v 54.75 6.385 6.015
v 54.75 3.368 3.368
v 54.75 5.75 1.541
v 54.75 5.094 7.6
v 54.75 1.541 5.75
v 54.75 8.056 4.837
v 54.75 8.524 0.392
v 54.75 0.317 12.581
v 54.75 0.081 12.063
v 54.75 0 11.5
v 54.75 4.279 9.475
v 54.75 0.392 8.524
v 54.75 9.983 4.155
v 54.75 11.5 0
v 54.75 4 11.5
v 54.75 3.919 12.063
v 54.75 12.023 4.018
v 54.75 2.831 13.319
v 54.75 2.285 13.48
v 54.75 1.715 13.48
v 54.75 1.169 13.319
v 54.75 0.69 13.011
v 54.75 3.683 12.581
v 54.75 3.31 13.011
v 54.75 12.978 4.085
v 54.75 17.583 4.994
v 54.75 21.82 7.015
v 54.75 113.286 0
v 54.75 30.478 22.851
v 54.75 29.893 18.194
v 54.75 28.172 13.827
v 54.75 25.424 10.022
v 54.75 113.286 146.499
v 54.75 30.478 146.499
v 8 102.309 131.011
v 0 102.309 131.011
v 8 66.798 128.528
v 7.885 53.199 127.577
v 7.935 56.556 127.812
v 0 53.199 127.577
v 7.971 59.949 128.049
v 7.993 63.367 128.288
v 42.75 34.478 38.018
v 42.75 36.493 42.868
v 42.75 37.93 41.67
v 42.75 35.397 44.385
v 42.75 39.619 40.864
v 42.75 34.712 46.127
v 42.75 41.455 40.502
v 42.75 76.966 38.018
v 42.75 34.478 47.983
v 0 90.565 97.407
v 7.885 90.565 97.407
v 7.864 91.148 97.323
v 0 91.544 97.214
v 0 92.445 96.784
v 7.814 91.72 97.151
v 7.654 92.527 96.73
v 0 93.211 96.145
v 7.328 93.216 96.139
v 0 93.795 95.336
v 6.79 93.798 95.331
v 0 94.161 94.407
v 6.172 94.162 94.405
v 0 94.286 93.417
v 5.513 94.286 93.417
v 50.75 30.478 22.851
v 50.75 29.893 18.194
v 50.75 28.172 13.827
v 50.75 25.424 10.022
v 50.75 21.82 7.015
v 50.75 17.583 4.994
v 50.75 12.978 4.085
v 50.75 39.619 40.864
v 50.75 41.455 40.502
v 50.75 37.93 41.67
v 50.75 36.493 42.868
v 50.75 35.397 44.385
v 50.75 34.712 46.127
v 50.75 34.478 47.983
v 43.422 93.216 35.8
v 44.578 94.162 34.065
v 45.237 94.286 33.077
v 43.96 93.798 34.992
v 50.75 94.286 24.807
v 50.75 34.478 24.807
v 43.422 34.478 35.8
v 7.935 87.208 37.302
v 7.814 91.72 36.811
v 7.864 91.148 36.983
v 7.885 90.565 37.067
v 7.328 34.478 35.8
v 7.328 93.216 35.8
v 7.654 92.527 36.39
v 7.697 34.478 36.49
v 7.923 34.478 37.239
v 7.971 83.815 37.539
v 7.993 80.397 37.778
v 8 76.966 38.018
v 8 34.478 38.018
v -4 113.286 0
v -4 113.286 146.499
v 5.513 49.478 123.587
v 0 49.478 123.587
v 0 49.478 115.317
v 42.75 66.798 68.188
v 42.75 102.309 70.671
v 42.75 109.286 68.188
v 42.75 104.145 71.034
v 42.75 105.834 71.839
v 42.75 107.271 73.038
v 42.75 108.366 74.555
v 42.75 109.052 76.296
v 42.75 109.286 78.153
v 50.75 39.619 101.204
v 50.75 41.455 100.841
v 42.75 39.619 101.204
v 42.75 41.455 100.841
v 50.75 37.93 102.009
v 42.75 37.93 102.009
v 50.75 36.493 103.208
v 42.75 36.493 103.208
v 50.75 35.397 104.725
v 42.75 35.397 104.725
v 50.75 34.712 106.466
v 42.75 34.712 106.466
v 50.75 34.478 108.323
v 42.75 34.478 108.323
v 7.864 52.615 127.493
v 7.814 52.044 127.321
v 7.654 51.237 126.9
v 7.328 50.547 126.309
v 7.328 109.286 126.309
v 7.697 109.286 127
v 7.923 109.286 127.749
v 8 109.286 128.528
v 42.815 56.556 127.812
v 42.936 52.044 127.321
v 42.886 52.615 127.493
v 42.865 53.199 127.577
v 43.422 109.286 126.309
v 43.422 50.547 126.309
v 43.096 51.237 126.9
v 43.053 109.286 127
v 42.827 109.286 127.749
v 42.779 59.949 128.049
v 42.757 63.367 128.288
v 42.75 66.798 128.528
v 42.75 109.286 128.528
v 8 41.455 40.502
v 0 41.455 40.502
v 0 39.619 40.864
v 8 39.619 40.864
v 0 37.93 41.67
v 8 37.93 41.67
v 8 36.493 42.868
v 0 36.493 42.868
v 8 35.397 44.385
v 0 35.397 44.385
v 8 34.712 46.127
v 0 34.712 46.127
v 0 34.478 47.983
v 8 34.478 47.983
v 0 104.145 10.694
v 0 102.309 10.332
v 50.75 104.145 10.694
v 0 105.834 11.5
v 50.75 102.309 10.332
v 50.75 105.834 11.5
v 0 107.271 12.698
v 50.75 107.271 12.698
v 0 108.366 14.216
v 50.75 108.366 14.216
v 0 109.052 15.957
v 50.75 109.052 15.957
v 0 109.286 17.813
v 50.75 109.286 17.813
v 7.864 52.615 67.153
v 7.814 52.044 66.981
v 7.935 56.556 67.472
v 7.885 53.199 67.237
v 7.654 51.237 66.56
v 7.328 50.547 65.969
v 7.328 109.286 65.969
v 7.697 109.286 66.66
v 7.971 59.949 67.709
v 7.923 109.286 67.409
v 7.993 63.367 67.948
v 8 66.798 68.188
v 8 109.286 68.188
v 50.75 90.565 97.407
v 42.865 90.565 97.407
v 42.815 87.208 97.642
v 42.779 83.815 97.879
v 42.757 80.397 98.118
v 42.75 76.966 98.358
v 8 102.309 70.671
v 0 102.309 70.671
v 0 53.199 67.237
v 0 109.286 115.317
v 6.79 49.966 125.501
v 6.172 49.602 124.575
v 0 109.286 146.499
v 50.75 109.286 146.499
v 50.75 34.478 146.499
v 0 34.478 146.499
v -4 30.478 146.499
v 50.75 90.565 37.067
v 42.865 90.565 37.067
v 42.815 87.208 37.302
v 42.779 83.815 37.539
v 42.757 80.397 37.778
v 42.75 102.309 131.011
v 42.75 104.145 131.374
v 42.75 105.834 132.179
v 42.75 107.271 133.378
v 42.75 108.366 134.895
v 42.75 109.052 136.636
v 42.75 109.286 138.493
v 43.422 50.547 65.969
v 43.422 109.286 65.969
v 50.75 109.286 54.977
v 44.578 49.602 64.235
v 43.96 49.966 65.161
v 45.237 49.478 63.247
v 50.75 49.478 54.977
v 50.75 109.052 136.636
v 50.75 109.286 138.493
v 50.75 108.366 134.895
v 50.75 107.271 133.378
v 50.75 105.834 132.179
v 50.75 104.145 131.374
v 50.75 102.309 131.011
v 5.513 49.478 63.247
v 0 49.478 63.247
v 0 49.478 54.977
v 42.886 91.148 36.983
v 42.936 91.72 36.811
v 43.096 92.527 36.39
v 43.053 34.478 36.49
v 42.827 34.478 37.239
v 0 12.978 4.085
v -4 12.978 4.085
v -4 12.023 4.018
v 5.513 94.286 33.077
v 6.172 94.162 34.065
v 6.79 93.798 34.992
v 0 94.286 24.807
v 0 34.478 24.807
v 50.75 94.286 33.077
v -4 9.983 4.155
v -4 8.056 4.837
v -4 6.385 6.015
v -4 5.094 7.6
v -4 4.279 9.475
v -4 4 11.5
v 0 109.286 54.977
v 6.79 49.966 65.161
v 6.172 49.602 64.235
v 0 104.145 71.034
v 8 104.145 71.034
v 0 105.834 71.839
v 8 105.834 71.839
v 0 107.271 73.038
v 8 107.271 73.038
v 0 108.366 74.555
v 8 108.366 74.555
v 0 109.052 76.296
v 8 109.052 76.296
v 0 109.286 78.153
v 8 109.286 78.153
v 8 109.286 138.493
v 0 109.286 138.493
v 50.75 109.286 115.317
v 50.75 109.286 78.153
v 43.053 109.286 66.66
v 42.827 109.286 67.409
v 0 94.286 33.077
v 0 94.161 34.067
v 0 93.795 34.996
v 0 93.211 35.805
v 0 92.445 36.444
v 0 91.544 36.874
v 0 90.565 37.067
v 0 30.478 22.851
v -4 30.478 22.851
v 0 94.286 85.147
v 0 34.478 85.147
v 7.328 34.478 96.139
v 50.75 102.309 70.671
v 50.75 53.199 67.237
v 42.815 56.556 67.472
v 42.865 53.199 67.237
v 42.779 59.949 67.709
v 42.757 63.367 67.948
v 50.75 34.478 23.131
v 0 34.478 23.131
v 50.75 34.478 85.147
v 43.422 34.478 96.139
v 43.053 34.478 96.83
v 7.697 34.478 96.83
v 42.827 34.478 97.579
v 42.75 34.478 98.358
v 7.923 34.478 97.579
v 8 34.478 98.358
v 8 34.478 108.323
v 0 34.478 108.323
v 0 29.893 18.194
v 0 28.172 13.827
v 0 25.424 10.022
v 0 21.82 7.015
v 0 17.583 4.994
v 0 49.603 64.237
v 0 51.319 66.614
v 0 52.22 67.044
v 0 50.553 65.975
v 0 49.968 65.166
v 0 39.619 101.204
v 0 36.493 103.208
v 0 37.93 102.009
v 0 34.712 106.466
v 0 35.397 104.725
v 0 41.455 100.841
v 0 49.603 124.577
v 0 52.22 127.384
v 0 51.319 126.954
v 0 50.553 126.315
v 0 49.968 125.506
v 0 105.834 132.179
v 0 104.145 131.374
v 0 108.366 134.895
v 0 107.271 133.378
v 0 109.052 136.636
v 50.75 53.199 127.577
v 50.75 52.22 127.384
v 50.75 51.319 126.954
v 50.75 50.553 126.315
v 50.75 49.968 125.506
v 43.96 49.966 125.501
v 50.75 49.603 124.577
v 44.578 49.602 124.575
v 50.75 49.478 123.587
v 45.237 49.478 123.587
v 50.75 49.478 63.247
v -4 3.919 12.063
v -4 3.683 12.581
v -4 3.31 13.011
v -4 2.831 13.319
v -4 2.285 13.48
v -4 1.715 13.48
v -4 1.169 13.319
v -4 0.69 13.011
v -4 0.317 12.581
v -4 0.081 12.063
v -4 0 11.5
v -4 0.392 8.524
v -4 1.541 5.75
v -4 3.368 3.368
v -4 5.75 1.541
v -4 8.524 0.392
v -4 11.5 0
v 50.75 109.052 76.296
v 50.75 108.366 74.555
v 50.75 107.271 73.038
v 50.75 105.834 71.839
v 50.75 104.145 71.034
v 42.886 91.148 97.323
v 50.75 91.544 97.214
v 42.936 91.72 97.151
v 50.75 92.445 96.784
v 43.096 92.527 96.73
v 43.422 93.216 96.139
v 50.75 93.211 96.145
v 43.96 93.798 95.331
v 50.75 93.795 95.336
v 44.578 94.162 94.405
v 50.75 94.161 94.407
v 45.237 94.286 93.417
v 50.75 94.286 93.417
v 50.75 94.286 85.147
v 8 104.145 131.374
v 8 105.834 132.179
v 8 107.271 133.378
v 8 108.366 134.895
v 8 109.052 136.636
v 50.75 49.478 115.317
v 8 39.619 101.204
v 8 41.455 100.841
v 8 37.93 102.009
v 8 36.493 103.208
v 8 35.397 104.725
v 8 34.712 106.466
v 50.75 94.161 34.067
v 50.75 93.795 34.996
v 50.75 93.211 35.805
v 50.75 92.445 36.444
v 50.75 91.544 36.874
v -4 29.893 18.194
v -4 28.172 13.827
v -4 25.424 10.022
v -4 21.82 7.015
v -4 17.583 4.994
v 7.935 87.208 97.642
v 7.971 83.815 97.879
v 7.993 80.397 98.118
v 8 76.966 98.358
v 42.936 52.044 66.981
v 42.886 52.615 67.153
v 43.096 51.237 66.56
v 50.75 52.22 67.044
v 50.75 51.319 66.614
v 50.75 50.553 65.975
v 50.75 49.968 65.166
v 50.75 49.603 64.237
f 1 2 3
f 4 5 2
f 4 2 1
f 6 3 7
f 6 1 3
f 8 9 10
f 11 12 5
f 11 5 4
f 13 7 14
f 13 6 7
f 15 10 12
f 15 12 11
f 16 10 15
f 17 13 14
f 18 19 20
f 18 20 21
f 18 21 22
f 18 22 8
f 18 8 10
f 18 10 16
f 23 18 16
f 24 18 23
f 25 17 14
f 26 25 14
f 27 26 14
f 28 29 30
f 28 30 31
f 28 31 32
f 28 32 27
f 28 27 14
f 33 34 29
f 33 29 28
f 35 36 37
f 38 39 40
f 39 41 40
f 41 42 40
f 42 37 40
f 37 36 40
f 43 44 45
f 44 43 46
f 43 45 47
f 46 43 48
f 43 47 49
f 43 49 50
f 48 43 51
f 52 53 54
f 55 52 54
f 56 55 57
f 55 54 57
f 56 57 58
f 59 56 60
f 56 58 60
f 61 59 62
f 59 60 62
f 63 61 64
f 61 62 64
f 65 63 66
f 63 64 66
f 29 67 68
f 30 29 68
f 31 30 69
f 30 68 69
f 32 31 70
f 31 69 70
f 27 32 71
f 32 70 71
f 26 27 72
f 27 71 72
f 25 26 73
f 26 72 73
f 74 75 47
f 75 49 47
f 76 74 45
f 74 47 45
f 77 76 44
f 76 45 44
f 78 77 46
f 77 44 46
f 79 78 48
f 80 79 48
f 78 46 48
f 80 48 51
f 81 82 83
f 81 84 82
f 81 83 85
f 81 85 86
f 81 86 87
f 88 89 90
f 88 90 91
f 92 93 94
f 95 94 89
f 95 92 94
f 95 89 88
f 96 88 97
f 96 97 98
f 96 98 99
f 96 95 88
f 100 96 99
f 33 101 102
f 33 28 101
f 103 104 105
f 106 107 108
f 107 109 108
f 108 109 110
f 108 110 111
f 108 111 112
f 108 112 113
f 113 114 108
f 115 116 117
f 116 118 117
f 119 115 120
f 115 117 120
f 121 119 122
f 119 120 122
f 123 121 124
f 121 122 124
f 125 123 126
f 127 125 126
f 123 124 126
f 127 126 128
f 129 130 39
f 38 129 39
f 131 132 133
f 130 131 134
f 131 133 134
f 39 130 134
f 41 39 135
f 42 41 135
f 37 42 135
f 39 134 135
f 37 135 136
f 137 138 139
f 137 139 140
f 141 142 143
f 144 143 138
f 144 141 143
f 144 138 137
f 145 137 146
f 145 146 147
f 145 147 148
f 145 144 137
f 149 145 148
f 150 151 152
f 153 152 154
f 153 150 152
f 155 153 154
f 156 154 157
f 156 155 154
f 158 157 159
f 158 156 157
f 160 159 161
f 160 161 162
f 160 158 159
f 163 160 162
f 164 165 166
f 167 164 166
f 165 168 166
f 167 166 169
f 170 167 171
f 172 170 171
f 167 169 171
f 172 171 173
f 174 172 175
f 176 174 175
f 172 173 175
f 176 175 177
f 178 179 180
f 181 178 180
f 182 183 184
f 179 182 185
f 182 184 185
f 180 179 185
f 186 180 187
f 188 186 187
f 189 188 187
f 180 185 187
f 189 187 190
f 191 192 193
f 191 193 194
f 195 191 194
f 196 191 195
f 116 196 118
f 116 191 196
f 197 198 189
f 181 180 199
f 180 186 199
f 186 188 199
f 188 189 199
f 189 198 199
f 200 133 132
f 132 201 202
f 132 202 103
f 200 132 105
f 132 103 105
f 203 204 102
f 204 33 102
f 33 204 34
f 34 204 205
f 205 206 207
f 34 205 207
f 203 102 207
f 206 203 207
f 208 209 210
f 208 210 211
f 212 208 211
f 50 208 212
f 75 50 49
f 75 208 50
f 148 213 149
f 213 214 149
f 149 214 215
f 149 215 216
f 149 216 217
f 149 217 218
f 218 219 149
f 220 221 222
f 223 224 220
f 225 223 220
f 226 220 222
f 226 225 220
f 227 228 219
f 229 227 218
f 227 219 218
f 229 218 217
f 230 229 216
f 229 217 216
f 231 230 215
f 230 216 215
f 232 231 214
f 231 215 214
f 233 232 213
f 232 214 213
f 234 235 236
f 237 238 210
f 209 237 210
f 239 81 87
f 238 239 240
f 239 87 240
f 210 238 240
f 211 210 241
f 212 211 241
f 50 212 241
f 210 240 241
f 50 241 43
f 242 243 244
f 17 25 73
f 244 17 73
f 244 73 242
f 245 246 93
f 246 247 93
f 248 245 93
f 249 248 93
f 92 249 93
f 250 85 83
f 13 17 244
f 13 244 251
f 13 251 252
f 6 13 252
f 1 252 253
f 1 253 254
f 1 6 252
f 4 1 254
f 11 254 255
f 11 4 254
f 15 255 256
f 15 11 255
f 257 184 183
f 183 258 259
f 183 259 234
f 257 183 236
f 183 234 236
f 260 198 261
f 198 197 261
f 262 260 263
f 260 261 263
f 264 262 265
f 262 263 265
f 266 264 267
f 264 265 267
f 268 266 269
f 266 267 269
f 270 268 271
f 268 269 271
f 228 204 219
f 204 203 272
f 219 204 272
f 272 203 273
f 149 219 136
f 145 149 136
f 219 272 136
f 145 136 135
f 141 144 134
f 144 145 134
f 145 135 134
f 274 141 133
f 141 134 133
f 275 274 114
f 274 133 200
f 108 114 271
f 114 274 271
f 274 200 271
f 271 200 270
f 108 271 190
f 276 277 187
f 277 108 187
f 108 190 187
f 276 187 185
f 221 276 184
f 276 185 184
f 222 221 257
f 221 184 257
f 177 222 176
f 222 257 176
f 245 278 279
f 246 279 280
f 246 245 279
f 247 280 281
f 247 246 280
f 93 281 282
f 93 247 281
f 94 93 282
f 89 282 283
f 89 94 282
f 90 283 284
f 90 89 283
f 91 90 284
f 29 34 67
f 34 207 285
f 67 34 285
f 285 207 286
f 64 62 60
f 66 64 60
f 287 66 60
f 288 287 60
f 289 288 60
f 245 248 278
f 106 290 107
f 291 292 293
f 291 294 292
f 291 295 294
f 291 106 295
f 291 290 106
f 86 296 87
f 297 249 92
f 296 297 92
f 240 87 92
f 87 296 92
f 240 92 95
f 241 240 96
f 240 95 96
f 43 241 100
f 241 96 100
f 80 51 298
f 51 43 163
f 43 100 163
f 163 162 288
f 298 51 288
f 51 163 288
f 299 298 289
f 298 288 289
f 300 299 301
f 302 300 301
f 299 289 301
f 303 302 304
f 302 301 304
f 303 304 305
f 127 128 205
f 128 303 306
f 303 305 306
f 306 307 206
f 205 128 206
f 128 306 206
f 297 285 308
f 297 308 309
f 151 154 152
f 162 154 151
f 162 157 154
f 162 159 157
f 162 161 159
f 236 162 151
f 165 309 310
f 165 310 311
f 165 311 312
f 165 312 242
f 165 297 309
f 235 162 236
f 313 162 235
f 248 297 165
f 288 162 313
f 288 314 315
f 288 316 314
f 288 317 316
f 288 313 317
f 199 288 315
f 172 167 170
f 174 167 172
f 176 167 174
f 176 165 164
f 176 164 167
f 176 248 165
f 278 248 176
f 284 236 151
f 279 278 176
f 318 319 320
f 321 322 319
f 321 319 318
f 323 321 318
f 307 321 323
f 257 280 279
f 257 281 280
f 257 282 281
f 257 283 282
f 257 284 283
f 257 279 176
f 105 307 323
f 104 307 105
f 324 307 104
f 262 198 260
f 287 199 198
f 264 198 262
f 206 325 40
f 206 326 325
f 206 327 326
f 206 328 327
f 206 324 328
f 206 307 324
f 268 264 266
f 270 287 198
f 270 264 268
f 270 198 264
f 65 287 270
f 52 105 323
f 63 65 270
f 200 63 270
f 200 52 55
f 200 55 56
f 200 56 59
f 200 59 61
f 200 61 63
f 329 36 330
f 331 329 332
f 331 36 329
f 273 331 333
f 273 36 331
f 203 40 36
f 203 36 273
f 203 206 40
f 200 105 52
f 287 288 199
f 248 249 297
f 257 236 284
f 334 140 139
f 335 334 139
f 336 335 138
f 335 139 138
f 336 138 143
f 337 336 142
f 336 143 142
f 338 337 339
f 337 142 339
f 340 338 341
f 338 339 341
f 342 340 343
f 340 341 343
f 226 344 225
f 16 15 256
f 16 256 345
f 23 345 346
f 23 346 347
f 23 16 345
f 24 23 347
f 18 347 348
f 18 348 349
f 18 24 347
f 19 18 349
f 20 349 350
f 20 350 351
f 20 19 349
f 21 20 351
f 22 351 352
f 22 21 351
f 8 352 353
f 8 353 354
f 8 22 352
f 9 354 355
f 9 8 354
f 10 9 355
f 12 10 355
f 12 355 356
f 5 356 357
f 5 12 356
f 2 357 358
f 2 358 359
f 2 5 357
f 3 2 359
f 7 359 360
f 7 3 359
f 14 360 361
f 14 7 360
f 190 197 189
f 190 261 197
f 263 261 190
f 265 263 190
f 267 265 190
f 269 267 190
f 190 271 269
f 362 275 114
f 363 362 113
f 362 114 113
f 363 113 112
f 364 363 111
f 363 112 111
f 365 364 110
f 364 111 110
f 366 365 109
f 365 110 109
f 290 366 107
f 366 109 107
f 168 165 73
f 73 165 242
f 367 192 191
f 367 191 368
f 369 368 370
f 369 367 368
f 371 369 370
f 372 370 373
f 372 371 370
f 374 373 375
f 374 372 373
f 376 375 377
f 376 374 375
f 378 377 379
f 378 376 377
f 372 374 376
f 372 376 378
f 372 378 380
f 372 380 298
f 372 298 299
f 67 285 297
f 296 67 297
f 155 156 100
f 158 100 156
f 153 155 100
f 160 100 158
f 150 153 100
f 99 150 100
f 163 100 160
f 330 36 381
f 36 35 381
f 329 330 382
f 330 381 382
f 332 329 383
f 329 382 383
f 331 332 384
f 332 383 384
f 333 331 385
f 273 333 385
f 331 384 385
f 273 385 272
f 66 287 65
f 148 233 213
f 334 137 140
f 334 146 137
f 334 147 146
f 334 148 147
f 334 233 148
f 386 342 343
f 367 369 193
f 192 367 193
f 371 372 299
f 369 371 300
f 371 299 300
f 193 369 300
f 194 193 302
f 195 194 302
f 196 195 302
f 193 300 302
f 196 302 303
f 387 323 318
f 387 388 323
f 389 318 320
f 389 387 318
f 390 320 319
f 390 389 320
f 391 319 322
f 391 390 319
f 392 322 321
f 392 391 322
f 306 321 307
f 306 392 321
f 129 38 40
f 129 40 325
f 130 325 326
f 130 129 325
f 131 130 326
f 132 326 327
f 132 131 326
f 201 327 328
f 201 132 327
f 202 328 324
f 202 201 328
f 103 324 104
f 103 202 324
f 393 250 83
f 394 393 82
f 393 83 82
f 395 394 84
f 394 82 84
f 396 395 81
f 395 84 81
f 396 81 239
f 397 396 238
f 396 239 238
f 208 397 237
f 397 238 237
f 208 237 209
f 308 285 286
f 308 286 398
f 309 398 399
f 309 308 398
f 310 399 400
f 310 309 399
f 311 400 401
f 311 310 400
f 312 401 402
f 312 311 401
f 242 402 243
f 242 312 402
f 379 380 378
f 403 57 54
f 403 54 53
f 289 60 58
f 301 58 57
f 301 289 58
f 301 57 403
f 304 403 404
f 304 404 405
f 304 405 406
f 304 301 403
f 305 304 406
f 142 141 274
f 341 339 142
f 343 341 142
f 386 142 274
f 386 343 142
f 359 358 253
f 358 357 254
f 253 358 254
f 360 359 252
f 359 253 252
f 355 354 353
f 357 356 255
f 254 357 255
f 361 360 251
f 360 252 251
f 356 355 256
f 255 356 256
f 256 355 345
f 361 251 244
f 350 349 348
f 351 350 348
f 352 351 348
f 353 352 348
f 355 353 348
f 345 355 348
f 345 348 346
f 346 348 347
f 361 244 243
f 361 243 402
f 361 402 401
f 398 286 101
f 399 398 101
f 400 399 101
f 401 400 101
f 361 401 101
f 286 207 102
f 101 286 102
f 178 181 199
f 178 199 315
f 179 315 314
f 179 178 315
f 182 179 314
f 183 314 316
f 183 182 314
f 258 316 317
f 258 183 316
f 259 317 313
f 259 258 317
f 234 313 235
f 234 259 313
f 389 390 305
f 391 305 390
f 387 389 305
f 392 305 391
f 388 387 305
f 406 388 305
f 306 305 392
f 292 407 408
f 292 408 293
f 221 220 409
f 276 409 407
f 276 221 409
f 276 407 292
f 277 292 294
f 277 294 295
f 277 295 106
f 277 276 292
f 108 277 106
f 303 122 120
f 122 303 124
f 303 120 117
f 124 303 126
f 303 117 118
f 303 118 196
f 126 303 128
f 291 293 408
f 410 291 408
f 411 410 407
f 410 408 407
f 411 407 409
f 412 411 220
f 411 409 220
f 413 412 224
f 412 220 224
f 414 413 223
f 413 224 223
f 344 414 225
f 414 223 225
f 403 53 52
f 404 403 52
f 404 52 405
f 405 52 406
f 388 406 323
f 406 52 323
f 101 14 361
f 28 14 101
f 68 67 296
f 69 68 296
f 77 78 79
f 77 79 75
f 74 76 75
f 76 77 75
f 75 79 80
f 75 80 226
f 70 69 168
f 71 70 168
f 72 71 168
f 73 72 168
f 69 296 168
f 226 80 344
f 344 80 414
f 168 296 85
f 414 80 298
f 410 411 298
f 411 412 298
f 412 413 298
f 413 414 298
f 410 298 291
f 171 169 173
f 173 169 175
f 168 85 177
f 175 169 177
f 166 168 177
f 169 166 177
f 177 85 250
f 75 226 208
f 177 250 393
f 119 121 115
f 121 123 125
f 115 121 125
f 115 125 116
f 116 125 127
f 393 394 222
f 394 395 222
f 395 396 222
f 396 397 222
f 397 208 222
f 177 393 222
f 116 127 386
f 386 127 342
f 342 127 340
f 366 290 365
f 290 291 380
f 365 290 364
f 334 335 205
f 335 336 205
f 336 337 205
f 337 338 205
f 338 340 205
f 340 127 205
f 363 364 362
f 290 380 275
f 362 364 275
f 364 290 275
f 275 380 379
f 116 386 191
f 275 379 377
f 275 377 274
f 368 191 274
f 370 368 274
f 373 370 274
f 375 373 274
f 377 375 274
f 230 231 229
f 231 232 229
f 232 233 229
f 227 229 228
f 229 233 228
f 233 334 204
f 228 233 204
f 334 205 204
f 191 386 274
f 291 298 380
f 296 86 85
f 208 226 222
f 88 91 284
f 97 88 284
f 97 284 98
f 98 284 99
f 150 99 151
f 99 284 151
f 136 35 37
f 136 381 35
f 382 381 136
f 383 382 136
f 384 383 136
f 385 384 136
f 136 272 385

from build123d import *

# Parameters (mm, degrees)
F1_DEPTH  = 4
F2_DEPTH  = 8
F4_DEPTH  = 59.8075599705
F6_DEPTH  = 59.8075599705
F8_DEPTH  = 59.8075599705
F10_DEPTH = 59.8075599705
F11_F1_R  = 4
F11_F2_R  = 4
F11_F3_R  = 4
F11_F4_R  = 4
F11_F5_R  = 4
F11_F6_R  = 4
F11_F7_R  = 4
F11_F8_R  = 4
F14_DEPTH = 50.75
F15_R     = 7.5


with BuildPart() as f1:
    # F0 (on Right) → F1 (new body)
    with BuildSketch(Plane.YZ):
        Polygon((34.4781084829, 146.4990389768), (30.4781084829, 146.4990389768), (30.4781084829, 22.8514976037), (34.4781084829, 23.1312048515), (34.4781084829, 24.8072521052), (34.4781084829, 40.989404104), (34.4781084829, 85.147008687), (34.4781084829, 101.3291606859), align=None)
        Polygon((109.2856684534, 146.4990389768), (34.4781084829, 146.4990389768), (34.4781084829, 101.3291606859), (94.2856684534, 97.147008687), (94.2856684534, 85.147008687), (34.4781084829, 85.147008687), (34.4781084829, 40.989404104), (94.2856684534, 36.8072521052), (94.2856684534, 24.8072521052), (34.4781084829, 24.8072521052), (34.4781084829, 23.1312048515), (30.4781084829, 22.8514976037), (30.4781084829, 5.3087643873), (109.2856684534, 10.8195258131), (109.2856684534, 54.9771303961), (49.4781084829, 54.9771303961), (49.4781084829, 66.9771303961), (109.2856684534, 71.159282395), (109.2856684534, 115.3168869779), (49.4781084829, 115.3168869779), (49.4781084829, 127.3168869779), (109.2856684534, 131.4990389768), align=None)
        Polygon((109.2856684534, 115.3168869779), (109.2856684534, 131.4990389768), (49.4781084829, 127.3168869779), (49.4781084829, 115.3168869779), align=None)
        Polygon((94.2856684534, 97.147008687), (34.4781084829, 101.3291606859), (34.4781084829, 85.147008687), (94.2856684534, 85.147008687), align=None)
        Polygon((49.4781084829, 54.9771303961), (109.2856684534, 54.9771303961), (109.2856684534, 71.159282395), (49.4781084829, 66.9771303961), align=None)
        Polygon((34.4781084829, 40.989404104), (34.4781084829, 24.8072521052), (94.2856684534, 24.8072521052), (94.2856684534, 36.8072521052), align=None)
        Polygon((113.2856684534, 146.4990389768), (109.2856684534, 146.4990389768), (109.2856684534, 131.4990389768), (109.2856684534, 115.3168869779), (109.2856684534, 71.159282395), (109.2856684534, 54.9771303961), (109.2856684534, 10.8195258131), (30.4781084829, 5.3087643873), (30.4781084829, 0), (113.2856684534, 0), align=None)
        with BuildLine():
            Line((30.4781084829, 0), (30.4781084829, 5.3087643873))
            Line((30.4781084829, 5.3087643873), (12.9781084829, 4.0850451783))
            Line((12.9781084829, 4.0850451783), (12.0231735531, 4.0182696231))
            ThreePointArc((12.0231735531, 4.0182696231), (6.3850122995, 6.0148472379), (4, 11.5))
            ThreePointArc((4, 11.5), (2, 13.5), (0, 11.5))
            ThreePointArc((0, 11.5), (3.3682720164, 3.3682720164), (11.5, 0))
            Line((11.5, 0), (30.4781084829, 0))
        make_face()
        with BuildLine():
            Line((30.4781084829, 5.3087643873), (30.4781084829, 22.8514976037))
            ThreePointArc((30.4781084829, 22.8514976037), (25.4242595831, 10.0215547294), (12.9781084829, 4.0850451783))
            Line((12.9781084829, 4.0850451783), (30.4781084829, 5.3087643873))
        make_face()
    extrude(amount=-F1_DEPTH)

    # F0 (on Right) → F2 (join)
    with BuildSketch(Plane.YZ):
        Polygon((109.2856684534, 115.3168869779), (109.2856684534, 131.4990389768), (49.4781084829, 127.3168869779), (49.4781084829, 115.3168869779), align=None)
        Polygon((94.2856684534, 97.147008687), (34.4781084829, 101.3291606859), (34.4781084829, 85.147008687), (94.2856684534, 85.147008687), align=None)
        Polygon((49.4781084829, 54.9771303961), (109.2856684534, 54.9771303961), (109.2856684534, 71.159282395), (49.4781084829, 66.9771303961), align=None)
        Polygon((34.4781084829, 40.989404104), (34.4781084829, 24.8072521052), (94.2856684534, 24.8072521052), (94.2856684534, 36.8072521052), align=None)
    extrude(amount=F2_DEPTH)

    # F3 (on face) → F4 (cut, through all)
    with BuildSketch(Plane.XZ.offset(-49.4781084829)):
        Polygon((0, 115.3168869779), (8, 115.3168869779), (8, 127.3168869779), align=None)
    extrude(amount=-F4_DEPTH, mode=Mode.SUBTRACT)

    # F5 (on face) → F6 (cut, through all)
    with BuildSketch(Plane(origin=(0, 94.2856684534, 0), x_dir=(-1, 0, 0), z_dir=(0, 1, 0))):
        Polygon((-8, 85.147008687), (0, 85.147008687), (-8, 97.147008687), align=None)
    extrude(amount=-F6_DEPTH, mode=Mode.SUBTRACT)

    # F7 (on face) → F8 (cut, through all)
    with BuildSketch(Plane.XZ.offset(-49.4781084829)):
        Polygon((8, 66.9771303961), (0, 54.9771303961), (8, 54.9771303961), align=None)
    extrude(amount=-F8_DEPTH, mode=Mode.SUBTRACT)

    # F9 (on face) → F10 (cut, through all)
    with BuildSketch(Plane(origin=(0, 94.2856684534, 0), x_dir=(-1, 0, 0), z_dir=(0, 1, 0))):
        Polygon((0, 24.8072521052), (-8, 36.8072521052), (-8, 24.8072521052), align=None)
    extrude(amount=-F10_DEPTH, mode=Mode.SUBTRACT)

    # F11: fillet of radius 4 on 8 edges, made by hand

    # F11_f1
    f11_f1_edges = [f1.edges().sort_by_distance(p)[0] for p in [
        (4, 94.2856684534, 36.8072521052),
    ]]
    fillet(f11_f1_edges, radius=F11_F1_R)

    # F11_f2
    f11_f2_edges = [f1.edges().sort_by_distance(p)[0] for p in [
        (8, 63.1041505096, 36.8072521052),
    ]]
    fillet(f11_f2_edges, radius=F11_F2_R)

    # F11_f3
    f11_f3_edges = [f1.edges().sort_by_distance(p)[0] for p in [
        (4, 49.4781084829, 66.9771303961),
    ]]
    fillet(f11_f3_edges, radius=F11_F3_R)

    # F11_f4
    f11_f4_edges = [f1.edges().sort_by_distance(p)[0] for p in [
        (8, 80.6596264267, 66.9771303961),
    ]]
    fillet(f11_f4_edges, radius=F11_F4_R)

    # F11_f5
    f11_f5_edges = [f1.edges().sort_by_distance(p)[0] for p in [
        (4, 94.2856684534, 97.147008687),
    ]]
    fillet(f11_f5_edges, radius=F11_F5_R)

    # F11_f6
    f11_f6_edges = [f1.edges().sort_by_distance(p)[0] for p in [
        (8, 63.1041505096, 97.147008687),
    ]]
    fillet(f11_f6_edges, radius=F11_F6_R)

    # F11_f7
    f11_f7_edges = [f1.edges().sort_by_distance(p)[0] for p in [
        (4, 49.4781084829, 127.3168869779),
    ]]
    fillet(f11_f7_edges, radius=F11_F7_R)

    # F11_f8
    f11_f8_edges = [f1.edges().sort_by_distance(p)[0] for p in [
        (8, 80.6596264267, 127.3168869779),
    ]]
    fillet(f11_f8_edges, radius=F11_F8_R)


with BuildPart() as f12_1:
    # F12: instance of F1
    add(f1.part.mirror(Plane(origin=(0, 70.5723781379, 70.1443425212), x_dir=(0, 1, 0), z_dir=(1, 0, 0))))


with BuildPart() as f12_1_1:
    # F13: moved
    add(f12_1.part.moved(Location((50.75, 0, 0))))


with BuildPart() as f1_1:
    add(f1.part)

    add(f12_1_1.part)  # F14 merges F12_1
    # F0 (on Right) → F14 (join, through all)
    with BuildSketch(Plane.YZ):
        Polygon((34.4781084829, 146.4990389768), (30.4781084829, 146.4990389768), (30.4781084829, 22.8514976037), (34.4781084829, 23.1312048515), (34.4781084829, 24.8072521052), (34.4781084829, 40.989404104), (34.4781084829, 85.147008687), (34.4781084829, 101.3291606859), align=None)
        Polygon((113.2856684534, 146.4990389768), (109.2856684534, 146.4990389768), (109.2856684534, 131.4990389768), (109.2856684534, 115.3168869779), (109.2856684534, 71.159282395), (109.2856684534, 54.9771303961), (109.2856684534, 10.8195258131), (30.4781084829, 5.3087643873), (30.4781084829, 0), (113.2856684534, 0), align=None)
        with BuildLine():
            Line((30.4781084829, 0), (30.4781084829, 5.3087643873))
            Line((30.4781084829, 5.3087643873), (12.9781084829, 4.0850451783))
            Line((12.9781084829, 4.0850451783), (12.0231735531, 4.0182696231))
            ThreePointArc((12.0231735531, 4.0182696231), (6.3850122995, 6.0148472379), (4, 11.5))
            ThreePointArc((4, 11.5), (2, 13.5), (0, 11.5))
            ThreePointArc((0, 11.5), (3.3682720164, 3.3682720164), (11.5, 0))
            Line((11.5, 0), (30.4781084829, 0))
        make_face()
    extrude(amount=F14_DEPTH)

    # F15
    f15_edges = [f1_1.edges().sort_by_distance(p)[0] for p in [
        (4, 109.285668, 131.499039),
        (4, 109.285668, 71.159282),
        (46.75, 109.285668, 71.159282),
        (46.75, 109.285668, 131.499039),
        (4, 34.478108, 40.989404),
        (4, 34.478108, 101.329161),
        (46.75, 34.478108, 40.989404),
        (46.75, 34.478108, 101.329161),
        (25.375, 109.285668, 10.819526),
    ]]
    fillet(f15_edges, radius=F15_R)


solid = f1_1.part
